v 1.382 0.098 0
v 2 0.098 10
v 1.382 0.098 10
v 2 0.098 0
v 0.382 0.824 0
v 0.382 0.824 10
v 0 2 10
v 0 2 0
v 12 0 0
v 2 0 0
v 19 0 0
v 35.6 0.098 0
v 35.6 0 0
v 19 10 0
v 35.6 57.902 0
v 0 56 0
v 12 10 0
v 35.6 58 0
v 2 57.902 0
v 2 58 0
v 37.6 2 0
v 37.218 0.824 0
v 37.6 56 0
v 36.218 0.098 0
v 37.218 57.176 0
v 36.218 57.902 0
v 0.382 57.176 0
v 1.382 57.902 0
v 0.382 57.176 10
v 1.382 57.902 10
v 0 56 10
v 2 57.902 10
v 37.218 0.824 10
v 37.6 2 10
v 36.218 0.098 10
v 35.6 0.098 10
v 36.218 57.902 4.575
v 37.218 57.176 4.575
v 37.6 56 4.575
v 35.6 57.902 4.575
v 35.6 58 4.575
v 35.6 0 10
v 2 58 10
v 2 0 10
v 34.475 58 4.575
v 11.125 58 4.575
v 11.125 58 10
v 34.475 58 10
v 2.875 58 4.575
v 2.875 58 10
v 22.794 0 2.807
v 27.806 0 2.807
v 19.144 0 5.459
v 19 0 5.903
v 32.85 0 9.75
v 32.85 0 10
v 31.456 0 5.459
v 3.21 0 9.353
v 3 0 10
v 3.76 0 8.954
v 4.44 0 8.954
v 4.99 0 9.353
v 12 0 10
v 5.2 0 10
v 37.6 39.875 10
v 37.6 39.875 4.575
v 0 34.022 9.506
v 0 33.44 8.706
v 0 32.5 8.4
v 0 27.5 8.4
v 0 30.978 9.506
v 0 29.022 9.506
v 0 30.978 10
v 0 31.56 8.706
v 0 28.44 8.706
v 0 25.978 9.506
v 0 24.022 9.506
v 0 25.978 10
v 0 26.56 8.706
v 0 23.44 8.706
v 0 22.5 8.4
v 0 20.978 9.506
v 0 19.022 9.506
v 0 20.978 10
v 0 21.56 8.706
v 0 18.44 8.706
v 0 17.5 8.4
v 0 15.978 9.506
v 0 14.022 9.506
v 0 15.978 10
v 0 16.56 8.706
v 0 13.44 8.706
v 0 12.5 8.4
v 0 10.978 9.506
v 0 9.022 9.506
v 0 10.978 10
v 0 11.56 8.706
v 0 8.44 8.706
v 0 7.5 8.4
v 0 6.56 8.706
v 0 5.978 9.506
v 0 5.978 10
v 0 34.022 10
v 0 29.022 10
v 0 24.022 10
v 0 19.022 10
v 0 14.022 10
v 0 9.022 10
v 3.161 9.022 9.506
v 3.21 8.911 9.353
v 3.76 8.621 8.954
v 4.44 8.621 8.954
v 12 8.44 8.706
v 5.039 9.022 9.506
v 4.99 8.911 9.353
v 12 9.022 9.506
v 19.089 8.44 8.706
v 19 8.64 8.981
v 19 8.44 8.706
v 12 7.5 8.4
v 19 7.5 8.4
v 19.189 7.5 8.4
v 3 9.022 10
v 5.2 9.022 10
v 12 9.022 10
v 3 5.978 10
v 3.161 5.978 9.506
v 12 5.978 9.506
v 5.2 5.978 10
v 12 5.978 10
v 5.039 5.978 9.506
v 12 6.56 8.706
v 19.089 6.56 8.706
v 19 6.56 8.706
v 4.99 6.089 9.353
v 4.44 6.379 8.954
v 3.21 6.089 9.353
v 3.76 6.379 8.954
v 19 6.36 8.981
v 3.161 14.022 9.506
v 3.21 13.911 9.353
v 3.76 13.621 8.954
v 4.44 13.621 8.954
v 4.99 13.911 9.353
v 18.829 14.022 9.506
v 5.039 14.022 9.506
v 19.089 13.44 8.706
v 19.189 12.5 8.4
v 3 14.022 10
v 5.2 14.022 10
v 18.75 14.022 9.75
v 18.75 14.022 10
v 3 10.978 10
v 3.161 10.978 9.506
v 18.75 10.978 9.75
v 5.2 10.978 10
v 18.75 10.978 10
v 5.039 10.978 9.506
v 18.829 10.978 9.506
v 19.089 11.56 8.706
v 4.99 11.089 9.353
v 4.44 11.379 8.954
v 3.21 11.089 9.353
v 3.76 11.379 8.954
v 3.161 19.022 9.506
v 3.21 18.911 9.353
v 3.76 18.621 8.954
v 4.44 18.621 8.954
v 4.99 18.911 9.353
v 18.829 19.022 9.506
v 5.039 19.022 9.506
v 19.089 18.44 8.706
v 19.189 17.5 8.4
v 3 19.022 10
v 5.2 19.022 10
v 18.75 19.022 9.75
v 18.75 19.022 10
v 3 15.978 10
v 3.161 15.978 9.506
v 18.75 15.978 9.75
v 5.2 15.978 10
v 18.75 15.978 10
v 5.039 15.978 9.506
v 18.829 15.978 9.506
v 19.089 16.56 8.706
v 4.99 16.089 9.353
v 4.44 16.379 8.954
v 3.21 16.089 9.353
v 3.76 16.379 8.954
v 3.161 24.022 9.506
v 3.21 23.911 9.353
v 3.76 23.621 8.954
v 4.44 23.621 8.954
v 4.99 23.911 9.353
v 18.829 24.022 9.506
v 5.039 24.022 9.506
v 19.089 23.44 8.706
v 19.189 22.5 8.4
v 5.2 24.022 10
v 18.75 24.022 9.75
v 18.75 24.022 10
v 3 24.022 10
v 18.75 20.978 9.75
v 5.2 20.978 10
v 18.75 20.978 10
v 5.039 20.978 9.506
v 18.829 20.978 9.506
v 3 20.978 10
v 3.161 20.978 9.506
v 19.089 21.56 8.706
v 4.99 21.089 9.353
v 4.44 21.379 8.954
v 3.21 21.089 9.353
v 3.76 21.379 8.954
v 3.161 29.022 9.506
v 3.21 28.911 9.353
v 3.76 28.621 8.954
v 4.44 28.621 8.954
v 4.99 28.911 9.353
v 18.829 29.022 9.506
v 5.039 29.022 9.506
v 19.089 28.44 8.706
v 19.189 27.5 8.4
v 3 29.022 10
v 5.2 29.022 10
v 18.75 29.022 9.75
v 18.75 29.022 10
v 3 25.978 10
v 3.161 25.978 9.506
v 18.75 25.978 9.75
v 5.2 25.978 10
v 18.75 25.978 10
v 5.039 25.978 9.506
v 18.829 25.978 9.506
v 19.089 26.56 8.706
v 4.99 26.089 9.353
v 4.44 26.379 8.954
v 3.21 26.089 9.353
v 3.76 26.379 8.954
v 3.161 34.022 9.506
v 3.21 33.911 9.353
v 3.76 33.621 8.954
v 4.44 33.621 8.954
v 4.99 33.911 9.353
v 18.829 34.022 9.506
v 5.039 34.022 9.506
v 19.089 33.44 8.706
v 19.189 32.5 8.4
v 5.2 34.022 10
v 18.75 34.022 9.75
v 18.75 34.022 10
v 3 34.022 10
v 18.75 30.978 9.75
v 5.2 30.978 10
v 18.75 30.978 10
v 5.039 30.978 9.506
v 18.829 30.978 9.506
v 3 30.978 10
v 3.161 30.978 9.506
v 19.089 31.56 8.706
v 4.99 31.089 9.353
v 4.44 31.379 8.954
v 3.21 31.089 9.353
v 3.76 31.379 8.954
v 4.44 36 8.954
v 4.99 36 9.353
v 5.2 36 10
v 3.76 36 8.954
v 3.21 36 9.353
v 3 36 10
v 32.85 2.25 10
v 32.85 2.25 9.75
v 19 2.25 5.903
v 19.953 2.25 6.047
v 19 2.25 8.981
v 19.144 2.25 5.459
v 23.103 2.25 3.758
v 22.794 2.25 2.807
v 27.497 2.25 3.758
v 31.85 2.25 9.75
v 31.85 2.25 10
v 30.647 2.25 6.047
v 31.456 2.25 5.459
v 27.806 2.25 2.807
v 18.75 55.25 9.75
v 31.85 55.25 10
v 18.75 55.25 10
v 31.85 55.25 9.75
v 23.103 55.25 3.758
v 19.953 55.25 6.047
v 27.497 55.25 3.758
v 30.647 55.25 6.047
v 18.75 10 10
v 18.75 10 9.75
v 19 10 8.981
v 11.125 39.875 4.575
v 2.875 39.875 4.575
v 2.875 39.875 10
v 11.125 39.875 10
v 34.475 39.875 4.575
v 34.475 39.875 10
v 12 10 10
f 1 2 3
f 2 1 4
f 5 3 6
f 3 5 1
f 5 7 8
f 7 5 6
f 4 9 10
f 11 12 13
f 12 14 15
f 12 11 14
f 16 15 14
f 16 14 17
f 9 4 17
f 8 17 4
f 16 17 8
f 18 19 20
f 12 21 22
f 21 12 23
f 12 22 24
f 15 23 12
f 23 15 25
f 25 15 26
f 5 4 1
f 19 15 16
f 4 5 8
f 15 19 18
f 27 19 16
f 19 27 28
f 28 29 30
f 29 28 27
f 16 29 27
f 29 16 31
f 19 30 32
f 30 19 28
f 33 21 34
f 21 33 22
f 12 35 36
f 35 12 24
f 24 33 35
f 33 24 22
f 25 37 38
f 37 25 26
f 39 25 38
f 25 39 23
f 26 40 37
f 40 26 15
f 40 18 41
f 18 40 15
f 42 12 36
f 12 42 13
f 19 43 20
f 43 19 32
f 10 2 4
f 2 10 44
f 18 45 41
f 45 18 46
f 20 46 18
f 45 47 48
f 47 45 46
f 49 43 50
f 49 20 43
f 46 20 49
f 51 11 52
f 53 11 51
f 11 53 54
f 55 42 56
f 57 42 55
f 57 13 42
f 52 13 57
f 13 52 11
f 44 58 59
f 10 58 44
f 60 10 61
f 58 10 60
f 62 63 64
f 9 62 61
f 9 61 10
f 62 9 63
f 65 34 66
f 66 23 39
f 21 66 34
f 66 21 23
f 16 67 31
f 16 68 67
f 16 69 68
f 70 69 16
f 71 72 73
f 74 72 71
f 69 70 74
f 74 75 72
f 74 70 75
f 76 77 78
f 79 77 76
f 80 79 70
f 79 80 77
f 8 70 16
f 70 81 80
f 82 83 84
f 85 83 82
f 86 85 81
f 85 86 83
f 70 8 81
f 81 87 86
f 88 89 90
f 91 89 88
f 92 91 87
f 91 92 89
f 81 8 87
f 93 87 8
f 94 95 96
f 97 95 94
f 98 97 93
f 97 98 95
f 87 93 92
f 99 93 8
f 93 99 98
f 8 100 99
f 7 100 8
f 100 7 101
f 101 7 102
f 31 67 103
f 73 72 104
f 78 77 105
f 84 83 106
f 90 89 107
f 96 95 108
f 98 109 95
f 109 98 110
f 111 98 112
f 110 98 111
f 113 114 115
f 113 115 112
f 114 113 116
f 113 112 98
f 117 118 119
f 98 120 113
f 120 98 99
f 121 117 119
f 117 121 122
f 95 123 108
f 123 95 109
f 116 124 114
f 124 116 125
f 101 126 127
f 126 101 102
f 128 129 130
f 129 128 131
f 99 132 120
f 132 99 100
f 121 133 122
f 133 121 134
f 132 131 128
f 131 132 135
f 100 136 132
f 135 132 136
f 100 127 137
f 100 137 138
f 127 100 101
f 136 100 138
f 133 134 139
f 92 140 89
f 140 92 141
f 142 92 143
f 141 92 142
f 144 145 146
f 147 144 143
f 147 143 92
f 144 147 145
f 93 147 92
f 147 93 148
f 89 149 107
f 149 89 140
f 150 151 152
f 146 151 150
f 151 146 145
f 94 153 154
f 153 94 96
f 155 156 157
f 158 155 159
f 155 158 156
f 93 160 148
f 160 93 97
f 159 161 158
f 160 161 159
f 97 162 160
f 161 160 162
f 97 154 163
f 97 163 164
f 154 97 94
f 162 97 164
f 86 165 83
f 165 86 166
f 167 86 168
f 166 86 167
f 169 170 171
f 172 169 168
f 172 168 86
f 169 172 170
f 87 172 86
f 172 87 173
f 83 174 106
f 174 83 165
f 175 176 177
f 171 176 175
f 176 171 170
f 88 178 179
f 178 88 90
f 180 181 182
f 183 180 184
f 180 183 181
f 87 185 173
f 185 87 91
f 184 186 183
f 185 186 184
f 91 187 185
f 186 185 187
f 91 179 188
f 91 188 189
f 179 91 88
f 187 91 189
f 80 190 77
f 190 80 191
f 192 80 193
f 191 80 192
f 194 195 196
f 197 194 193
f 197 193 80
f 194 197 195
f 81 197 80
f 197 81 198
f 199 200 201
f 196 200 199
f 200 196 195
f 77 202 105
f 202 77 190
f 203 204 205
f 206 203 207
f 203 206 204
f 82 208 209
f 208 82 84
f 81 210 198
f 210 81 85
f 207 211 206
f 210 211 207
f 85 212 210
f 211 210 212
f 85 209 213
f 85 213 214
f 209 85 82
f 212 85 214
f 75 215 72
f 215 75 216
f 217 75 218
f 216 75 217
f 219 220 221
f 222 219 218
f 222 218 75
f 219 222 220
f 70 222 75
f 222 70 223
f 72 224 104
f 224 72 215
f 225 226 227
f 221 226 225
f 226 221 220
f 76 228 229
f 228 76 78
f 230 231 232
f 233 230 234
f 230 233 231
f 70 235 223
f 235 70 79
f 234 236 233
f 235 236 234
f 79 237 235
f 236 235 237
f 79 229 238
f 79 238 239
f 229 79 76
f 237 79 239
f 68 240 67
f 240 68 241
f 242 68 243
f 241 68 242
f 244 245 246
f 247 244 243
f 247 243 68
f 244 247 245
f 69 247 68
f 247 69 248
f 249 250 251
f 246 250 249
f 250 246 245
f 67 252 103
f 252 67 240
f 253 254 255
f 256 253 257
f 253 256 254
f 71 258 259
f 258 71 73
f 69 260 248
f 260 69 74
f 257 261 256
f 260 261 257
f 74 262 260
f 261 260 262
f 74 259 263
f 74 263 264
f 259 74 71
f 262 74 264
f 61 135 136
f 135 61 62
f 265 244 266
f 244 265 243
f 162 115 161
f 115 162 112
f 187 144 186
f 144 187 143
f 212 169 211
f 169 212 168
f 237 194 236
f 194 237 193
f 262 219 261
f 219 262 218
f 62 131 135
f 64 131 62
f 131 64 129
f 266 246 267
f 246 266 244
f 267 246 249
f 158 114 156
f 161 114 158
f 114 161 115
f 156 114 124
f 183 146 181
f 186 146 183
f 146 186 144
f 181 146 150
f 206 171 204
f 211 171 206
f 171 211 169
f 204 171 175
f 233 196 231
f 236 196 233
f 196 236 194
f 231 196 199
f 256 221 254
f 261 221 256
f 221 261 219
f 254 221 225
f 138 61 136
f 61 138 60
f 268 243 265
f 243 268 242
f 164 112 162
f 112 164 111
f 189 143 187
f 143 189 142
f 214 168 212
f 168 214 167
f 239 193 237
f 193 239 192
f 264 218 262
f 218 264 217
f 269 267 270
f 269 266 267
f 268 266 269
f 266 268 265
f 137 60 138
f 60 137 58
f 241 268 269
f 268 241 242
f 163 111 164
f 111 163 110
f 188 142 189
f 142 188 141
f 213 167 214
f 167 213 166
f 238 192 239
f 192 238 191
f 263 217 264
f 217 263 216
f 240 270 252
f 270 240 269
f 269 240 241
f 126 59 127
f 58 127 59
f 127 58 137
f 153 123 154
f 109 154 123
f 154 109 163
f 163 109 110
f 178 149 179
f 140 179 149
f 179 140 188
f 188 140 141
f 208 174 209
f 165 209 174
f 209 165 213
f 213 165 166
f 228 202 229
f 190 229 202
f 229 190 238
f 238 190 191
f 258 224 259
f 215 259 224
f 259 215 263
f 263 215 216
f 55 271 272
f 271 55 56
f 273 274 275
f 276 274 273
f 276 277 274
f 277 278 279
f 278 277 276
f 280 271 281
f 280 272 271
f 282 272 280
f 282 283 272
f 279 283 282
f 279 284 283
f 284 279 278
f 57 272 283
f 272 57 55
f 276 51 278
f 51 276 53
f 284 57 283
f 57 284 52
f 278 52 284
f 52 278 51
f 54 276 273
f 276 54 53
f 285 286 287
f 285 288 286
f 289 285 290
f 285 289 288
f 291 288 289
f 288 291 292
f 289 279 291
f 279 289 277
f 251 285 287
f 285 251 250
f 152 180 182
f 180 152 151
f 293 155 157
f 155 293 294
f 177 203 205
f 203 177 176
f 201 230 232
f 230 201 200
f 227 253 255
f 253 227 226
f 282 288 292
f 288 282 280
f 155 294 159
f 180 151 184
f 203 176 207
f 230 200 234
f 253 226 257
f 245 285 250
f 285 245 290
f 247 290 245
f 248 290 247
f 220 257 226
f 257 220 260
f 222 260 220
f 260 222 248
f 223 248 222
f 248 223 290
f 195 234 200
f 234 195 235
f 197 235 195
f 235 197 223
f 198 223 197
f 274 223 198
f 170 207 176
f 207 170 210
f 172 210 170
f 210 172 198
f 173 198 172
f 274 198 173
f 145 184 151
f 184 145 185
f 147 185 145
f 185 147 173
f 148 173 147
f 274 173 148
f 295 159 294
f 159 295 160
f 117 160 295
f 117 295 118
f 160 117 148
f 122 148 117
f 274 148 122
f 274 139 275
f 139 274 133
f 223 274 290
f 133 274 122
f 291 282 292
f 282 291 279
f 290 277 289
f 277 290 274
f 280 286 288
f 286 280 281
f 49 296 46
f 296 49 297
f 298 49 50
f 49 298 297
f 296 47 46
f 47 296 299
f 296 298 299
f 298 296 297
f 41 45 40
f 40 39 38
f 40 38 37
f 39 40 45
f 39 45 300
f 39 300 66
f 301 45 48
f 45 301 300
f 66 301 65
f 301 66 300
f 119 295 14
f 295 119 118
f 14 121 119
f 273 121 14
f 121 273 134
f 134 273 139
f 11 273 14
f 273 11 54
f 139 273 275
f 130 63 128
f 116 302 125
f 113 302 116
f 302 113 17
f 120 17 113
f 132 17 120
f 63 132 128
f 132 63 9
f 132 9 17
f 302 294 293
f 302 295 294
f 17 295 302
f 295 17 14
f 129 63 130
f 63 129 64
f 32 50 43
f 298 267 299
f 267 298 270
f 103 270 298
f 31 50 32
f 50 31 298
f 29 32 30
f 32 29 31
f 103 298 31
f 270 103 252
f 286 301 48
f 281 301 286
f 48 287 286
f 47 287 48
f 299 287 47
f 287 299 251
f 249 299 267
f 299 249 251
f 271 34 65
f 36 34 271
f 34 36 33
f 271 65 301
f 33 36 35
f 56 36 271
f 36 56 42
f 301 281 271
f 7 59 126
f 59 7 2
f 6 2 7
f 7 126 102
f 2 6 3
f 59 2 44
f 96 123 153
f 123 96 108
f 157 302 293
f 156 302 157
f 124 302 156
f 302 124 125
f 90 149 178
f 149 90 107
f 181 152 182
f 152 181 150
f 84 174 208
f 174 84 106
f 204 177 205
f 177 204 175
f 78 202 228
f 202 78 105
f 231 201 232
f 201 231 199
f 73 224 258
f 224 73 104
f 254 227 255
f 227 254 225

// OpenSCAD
// file: util.scad
module space(size){
  minkowski() {
	children(0);
	cube(size, center=true);
    //sphere(size, center=true,$fn=30);  
  }
}

module pinHole(length){
    PIN_DIAMETER = 3.2;
    rotate([0,90,0]){
      cylinder(d=PIN_DIAMETER,h=length,center=false); //The lip
      translate([0,0,length])
        sphere(d=PIN_DIAMETER);  
    }
}

function coreDiameter() = 12.6;

function coreLipDiameter() = coreDiameter()+2;

function padlockWidth() = 3+8+8+12.6+3+3;

function padlockDepth() = 4+5+5+5+5+5+5+6+18;

function padlockHeight() = 24;

function pin1Depth() = 7.5;
function pin2Depth() = 12.5;
function pin3Depth() = 17.5;
function pin4Depth() = 22.5;
function pin5Depth() = 27.5;
function pin6Depth() = 32.5;
// main file
include <MCAD/boxes.scad>
use <util.scad>

$fn = 10;

PINS_HOLDER_DIAMETER = 2.2;


SNUGNESS = 0.25;

difference(){
  translate([padlockWidth()/2,padlockDepth()/2,(padlockHeight()-5)/2])  
    roundedBox([padlockWidth(),padlockDepth(),padlockHeight()-5],radius = 2, sidesonly = 1);
  
  //Pin holder  
  translate([3+PINS_HOLDER_DIAMETER/2,0,10])
    rotate([-90,0,0])
      cylinder(d=PINS_HOLDER_DIAMETER, h=36);  
  
  //Core lip
  translate([3+8+8+coreDiameter()/2,0,10])
    rotate([-90,0,0])
      space(2*SNUGNESS)
        cylinder(d=14.6, h=2);  
  
  //Core  
  translate([3+8+8+coreDiameter()/2,2,10])
    rotate([-90,0,0])
      space(2*SNUGNESS)
        cylinder(d=12.6, h=(2+30+6+15));    
    
    
  //Left shackle cutout  
  translate([3,4+30+6,10-coreDiameter()/2+1])
    space(SNUGNESS)
      cube([8,18,10.5]);  

  //Right shackle cutout
  translate([3+8+8+coreDiameter()+3,4+30+6,10-coreDiameter()/2+1])
      space(SNUGNESS)
        cube([10,18,10.5]);
  
  // Pin 1  
  translate([0,pin1Depth(),10])
    pinHole(4+10+6+coreDiameter()/2);  
    
  // Pin 2  
  translate([0,pin2Depth(),10])
    pinHole(4+10+6+coreDiameter()/2);    

  // Pin 3  
  translate([0,pin3Depth(),10])
    pinHole(4+10+6+coreDiameter()/2);    

  // Pin 4  
  translate([0,pin4Depth(),10])
    pinHole(4+10+6+coreDiameter()/2);    

  // Pin 5  
  translate([0,pin5Depth(),10])
    pinHole(4+10+6+coreDiameter()/2);    
    
  // Retainer Pin
  translate([0,pin6Depth(),10])
    pinHole(4+10+6+coreDiameter()/2);         
  
  //Bearing hole
  translate([3+8+1,0,0])
    cube([7,10,10.5]);

translate([-10,-1,10])
  cube([100,100,10]);  
}
